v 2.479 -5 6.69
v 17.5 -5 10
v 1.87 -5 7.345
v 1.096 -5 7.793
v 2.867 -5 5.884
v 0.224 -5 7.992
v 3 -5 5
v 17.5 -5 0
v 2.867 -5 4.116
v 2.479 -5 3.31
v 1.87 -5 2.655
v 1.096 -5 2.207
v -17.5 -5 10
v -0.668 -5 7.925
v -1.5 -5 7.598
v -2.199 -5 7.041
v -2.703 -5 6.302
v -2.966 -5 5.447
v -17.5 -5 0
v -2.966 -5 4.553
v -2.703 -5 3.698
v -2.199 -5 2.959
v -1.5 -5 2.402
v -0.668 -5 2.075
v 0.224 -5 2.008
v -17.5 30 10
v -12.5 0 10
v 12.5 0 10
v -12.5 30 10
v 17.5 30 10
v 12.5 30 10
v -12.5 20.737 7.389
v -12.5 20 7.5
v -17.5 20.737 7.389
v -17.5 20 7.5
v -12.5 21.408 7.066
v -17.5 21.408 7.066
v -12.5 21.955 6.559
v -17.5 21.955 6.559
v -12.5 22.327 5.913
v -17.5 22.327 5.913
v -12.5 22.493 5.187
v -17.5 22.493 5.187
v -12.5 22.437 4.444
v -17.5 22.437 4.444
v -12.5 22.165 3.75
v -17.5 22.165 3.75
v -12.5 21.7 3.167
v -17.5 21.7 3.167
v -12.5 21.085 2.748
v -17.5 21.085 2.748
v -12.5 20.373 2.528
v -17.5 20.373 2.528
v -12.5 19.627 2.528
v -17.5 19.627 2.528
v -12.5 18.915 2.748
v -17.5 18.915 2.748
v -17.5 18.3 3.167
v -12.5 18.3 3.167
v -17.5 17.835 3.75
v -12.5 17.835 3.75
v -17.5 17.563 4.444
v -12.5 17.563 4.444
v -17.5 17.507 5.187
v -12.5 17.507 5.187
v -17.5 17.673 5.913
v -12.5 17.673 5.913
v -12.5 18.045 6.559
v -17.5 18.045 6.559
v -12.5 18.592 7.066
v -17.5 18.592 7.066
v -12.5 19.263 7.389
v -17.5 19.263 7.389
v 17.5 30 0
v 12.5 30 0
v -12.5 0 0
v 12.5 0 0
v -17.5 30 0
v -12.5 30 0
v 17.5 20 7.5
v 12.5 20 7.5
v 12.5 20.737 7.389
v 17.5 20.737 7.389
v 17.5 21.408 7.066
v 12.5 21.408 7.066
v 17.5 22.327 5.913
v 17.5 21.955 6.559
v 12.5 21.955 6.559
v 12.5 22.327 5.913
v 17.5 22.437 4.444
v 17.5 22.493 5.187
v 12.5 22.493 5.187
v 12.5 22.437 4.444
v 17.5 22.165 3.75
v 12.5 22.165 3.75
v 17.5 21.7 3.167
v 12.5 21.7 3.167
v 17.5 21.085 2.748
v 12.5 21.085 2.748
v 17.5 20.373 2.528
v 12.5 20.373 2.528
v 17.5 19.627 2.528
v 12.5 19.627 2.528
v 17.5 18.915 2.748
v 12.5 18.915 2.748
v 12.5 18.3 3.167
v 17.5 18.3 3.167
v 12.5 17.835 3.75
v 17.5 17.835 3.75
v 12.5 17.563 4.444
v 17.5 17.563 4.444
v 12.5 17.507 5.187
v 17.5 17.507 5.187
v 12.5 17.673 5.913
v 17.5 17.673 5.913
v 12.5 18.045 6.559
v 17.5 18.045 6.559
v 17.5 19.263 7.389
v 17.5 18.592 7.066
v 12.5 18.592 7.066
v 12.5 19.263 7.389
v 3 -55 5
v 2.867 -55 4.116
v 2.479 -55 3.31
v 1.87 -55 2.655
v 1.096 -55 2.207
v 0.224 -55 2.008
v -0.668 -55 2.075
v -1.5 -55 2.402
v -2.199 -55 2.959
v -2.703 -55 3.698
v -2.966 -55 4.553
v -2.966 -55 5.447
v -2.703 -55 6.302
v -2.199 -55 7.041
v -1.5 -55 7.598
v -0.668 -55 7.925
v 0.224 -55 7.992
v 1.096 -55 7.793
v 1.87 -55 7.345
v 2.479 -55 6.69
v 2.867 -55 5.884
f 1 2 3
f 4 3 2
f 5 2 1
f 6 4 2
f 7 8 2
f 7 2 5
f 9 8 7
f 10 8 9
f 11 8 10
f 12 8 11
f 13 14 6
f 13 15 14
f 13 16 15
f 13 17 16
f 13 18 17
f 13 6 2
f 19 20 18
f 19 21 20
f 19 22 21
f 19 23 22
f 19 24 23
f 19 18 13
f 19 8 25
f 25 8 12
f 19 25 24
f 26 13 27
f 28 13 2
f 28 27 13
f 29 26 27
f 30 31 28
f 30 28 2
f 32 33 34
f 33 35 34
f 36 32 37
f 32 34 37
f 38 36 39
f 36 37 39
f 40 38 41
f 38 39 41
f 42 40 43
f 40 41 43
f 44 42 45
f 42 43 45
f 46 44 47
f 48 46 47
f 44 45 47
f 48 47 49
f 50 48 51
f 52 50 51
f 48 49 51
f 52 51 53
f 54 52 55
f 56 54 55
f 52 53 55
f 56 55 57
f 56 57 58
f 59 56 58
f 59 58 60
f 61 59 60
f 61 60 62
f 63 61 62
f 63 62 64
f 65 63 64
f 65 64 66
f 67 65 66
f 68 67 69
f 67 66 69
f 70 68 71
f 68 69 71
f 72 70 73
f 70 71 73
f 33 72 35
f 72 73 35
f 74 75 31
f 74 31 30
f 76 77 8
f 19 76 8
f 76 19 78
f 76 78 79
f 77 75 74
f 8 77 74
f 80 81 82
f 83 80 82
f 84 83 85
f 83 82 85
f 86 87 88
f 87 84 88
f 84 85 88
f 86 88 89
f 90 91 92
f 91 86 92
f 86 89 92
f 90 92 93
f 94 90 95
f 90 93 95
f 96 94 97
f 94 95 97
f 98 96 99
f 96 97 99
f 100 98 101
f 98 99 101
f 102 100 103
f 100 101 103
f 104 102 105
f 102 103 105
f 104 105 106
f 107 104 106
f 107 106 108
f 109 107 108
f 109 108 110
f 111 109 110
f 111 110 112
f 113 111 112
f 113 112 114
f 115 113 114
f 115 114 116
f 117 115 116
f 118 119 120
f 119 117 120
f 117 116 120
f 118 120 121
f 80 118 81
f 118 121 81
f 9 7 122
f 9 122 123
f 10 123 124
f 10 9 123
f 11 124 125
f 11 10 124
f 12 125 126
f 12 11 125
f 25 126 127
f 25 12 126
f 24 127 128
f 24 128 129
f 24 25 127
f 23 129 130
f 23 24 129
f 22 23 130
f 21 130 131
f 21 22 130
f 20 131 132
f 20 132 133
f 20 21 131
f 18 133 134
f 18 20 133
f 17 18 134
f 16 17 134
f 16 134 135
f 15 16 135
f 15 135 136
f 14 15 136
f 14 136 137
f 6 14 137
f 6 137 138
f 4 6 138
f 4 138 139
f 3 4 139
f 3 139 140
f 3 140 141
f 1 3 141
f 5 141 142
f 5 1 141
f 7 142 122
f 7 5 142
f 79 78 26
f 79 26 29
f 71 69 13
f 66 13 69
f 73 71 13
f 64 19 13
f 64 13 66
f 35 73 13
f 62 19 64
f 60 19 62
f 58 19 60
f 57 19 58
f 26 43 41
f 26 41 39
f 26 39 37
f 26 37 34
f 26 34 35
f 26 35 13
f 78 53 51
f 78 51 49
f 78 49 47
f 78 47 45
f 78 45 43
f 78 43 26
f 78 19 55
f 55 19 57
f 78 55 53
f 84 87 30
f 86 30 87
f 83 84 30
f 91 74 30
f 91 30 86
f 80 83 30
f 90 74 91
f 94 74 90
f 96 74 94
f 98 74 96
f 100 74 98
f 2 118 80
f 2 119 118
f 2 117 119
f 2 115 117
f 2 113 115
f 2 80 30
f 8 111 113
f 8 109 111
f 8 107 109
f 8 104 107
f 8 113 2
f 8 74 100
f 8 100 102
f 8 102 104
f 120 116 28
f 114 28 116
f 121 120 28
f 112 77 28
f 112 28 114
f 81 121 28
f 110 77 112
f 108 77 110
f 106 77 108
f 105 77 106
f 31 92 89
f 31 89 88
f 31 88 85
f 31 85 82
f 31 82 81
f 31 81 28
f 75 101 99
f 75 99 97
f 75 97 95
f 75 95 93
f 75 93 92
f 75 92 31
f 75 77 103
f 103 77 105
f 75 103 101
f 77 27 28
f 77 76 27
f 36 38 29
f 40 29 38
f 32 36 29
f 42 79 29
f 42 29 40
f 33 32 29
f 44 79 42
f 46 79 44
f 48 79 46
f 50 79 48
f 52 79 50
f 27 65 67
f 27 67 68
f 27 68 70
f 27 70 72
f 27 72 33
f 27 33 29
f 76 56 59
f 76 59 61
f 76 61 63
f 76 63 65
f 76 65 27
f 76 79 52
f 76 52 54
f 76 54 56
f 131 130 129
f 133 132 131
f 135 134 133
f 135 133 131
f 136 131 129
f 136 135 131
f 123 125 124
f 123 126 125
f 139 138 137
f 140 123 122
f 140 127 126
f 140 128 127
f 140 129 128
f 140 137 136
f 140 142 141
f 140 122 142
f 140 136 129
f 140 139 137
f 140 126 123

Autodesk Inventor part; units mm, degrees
ref_plane "YZ Plane" through (0, 0, 0) normal (1, 0, 0) x (0, 1, 0)
ref_plane "XZ Plane" through (0, 0, 0) normal (0, 1, 0) x (-1, 0, 0)
ref_plane "XY Plane" through (0, 0, 0) normal (0, 0, 1) x (1, 0, 0)
sketch "Sketch1" plane through (0, 0, 0) normal (0, 0, 1) x (1, 0, 0)
  line L0 (0, 0) -> (12.5, 0)
  line L1 (12.5, 0) -> (12.5, 30)
  line L2 (12.5, 30) -> (17.5, 30)
  line L3 (17.5, 30) -> (17.5, -5)
  line L4 (17.5, -5) -> (-17.5, -5)
  line L5 (-17.5, -5) -> (-17.5, 30)
  line L6 (-17.5, 30) -> (-12.5, 30)
  line L7 (-12.5, 30) -> (-12.5, 0)
  line L8 (-12.5, 0) -> (12.5, 0)
  dimension "d0" = 12.5
  dimension "d1" = 30
  dimension "d2" = 5
  dimension "d3" = 35
  dimension "d4" = 35
  dimension "d5" = 35
  dimension "d6" = 5
  dimension "d8" = 30
extrude "Extrusion1" add sketch "Sketch1" along normal blind 10
sketch "Sketch2" plane through (-17.5, -5, 0) normal (0, -1, 0) x (1, 0, 0)
  line L0 (5, 10) -> (0, 10) projected
  line L1 (30, 0) -> (35, 0) projected
  line L2 (0, 10) -> (35, 0)
  circle A0 centre (17.5, 5) radius 3
  point P0 (17.5, 0)
  dimension "d11" = 6
extrude "Extrusion2" add sketch "Sketch2" along normal blind 50
sketch "Sketch3" plane through (-17.5, -5, 0) normal (-1, 0, 0) x (0, 0, 1)
  line L0 (0, 35) -> (10, 35) projected
  line L1 (5, 35) -> (5, 25)
  circle A0 centre (5, 25) radius 2.5
  point P0 (0, 5)
  dimension "d14" = 10
  dimension "d15" = 5
extrude "Extrusion3" cut sketch "Sketch3" against normal blind 35
properties part number "TopFork"
